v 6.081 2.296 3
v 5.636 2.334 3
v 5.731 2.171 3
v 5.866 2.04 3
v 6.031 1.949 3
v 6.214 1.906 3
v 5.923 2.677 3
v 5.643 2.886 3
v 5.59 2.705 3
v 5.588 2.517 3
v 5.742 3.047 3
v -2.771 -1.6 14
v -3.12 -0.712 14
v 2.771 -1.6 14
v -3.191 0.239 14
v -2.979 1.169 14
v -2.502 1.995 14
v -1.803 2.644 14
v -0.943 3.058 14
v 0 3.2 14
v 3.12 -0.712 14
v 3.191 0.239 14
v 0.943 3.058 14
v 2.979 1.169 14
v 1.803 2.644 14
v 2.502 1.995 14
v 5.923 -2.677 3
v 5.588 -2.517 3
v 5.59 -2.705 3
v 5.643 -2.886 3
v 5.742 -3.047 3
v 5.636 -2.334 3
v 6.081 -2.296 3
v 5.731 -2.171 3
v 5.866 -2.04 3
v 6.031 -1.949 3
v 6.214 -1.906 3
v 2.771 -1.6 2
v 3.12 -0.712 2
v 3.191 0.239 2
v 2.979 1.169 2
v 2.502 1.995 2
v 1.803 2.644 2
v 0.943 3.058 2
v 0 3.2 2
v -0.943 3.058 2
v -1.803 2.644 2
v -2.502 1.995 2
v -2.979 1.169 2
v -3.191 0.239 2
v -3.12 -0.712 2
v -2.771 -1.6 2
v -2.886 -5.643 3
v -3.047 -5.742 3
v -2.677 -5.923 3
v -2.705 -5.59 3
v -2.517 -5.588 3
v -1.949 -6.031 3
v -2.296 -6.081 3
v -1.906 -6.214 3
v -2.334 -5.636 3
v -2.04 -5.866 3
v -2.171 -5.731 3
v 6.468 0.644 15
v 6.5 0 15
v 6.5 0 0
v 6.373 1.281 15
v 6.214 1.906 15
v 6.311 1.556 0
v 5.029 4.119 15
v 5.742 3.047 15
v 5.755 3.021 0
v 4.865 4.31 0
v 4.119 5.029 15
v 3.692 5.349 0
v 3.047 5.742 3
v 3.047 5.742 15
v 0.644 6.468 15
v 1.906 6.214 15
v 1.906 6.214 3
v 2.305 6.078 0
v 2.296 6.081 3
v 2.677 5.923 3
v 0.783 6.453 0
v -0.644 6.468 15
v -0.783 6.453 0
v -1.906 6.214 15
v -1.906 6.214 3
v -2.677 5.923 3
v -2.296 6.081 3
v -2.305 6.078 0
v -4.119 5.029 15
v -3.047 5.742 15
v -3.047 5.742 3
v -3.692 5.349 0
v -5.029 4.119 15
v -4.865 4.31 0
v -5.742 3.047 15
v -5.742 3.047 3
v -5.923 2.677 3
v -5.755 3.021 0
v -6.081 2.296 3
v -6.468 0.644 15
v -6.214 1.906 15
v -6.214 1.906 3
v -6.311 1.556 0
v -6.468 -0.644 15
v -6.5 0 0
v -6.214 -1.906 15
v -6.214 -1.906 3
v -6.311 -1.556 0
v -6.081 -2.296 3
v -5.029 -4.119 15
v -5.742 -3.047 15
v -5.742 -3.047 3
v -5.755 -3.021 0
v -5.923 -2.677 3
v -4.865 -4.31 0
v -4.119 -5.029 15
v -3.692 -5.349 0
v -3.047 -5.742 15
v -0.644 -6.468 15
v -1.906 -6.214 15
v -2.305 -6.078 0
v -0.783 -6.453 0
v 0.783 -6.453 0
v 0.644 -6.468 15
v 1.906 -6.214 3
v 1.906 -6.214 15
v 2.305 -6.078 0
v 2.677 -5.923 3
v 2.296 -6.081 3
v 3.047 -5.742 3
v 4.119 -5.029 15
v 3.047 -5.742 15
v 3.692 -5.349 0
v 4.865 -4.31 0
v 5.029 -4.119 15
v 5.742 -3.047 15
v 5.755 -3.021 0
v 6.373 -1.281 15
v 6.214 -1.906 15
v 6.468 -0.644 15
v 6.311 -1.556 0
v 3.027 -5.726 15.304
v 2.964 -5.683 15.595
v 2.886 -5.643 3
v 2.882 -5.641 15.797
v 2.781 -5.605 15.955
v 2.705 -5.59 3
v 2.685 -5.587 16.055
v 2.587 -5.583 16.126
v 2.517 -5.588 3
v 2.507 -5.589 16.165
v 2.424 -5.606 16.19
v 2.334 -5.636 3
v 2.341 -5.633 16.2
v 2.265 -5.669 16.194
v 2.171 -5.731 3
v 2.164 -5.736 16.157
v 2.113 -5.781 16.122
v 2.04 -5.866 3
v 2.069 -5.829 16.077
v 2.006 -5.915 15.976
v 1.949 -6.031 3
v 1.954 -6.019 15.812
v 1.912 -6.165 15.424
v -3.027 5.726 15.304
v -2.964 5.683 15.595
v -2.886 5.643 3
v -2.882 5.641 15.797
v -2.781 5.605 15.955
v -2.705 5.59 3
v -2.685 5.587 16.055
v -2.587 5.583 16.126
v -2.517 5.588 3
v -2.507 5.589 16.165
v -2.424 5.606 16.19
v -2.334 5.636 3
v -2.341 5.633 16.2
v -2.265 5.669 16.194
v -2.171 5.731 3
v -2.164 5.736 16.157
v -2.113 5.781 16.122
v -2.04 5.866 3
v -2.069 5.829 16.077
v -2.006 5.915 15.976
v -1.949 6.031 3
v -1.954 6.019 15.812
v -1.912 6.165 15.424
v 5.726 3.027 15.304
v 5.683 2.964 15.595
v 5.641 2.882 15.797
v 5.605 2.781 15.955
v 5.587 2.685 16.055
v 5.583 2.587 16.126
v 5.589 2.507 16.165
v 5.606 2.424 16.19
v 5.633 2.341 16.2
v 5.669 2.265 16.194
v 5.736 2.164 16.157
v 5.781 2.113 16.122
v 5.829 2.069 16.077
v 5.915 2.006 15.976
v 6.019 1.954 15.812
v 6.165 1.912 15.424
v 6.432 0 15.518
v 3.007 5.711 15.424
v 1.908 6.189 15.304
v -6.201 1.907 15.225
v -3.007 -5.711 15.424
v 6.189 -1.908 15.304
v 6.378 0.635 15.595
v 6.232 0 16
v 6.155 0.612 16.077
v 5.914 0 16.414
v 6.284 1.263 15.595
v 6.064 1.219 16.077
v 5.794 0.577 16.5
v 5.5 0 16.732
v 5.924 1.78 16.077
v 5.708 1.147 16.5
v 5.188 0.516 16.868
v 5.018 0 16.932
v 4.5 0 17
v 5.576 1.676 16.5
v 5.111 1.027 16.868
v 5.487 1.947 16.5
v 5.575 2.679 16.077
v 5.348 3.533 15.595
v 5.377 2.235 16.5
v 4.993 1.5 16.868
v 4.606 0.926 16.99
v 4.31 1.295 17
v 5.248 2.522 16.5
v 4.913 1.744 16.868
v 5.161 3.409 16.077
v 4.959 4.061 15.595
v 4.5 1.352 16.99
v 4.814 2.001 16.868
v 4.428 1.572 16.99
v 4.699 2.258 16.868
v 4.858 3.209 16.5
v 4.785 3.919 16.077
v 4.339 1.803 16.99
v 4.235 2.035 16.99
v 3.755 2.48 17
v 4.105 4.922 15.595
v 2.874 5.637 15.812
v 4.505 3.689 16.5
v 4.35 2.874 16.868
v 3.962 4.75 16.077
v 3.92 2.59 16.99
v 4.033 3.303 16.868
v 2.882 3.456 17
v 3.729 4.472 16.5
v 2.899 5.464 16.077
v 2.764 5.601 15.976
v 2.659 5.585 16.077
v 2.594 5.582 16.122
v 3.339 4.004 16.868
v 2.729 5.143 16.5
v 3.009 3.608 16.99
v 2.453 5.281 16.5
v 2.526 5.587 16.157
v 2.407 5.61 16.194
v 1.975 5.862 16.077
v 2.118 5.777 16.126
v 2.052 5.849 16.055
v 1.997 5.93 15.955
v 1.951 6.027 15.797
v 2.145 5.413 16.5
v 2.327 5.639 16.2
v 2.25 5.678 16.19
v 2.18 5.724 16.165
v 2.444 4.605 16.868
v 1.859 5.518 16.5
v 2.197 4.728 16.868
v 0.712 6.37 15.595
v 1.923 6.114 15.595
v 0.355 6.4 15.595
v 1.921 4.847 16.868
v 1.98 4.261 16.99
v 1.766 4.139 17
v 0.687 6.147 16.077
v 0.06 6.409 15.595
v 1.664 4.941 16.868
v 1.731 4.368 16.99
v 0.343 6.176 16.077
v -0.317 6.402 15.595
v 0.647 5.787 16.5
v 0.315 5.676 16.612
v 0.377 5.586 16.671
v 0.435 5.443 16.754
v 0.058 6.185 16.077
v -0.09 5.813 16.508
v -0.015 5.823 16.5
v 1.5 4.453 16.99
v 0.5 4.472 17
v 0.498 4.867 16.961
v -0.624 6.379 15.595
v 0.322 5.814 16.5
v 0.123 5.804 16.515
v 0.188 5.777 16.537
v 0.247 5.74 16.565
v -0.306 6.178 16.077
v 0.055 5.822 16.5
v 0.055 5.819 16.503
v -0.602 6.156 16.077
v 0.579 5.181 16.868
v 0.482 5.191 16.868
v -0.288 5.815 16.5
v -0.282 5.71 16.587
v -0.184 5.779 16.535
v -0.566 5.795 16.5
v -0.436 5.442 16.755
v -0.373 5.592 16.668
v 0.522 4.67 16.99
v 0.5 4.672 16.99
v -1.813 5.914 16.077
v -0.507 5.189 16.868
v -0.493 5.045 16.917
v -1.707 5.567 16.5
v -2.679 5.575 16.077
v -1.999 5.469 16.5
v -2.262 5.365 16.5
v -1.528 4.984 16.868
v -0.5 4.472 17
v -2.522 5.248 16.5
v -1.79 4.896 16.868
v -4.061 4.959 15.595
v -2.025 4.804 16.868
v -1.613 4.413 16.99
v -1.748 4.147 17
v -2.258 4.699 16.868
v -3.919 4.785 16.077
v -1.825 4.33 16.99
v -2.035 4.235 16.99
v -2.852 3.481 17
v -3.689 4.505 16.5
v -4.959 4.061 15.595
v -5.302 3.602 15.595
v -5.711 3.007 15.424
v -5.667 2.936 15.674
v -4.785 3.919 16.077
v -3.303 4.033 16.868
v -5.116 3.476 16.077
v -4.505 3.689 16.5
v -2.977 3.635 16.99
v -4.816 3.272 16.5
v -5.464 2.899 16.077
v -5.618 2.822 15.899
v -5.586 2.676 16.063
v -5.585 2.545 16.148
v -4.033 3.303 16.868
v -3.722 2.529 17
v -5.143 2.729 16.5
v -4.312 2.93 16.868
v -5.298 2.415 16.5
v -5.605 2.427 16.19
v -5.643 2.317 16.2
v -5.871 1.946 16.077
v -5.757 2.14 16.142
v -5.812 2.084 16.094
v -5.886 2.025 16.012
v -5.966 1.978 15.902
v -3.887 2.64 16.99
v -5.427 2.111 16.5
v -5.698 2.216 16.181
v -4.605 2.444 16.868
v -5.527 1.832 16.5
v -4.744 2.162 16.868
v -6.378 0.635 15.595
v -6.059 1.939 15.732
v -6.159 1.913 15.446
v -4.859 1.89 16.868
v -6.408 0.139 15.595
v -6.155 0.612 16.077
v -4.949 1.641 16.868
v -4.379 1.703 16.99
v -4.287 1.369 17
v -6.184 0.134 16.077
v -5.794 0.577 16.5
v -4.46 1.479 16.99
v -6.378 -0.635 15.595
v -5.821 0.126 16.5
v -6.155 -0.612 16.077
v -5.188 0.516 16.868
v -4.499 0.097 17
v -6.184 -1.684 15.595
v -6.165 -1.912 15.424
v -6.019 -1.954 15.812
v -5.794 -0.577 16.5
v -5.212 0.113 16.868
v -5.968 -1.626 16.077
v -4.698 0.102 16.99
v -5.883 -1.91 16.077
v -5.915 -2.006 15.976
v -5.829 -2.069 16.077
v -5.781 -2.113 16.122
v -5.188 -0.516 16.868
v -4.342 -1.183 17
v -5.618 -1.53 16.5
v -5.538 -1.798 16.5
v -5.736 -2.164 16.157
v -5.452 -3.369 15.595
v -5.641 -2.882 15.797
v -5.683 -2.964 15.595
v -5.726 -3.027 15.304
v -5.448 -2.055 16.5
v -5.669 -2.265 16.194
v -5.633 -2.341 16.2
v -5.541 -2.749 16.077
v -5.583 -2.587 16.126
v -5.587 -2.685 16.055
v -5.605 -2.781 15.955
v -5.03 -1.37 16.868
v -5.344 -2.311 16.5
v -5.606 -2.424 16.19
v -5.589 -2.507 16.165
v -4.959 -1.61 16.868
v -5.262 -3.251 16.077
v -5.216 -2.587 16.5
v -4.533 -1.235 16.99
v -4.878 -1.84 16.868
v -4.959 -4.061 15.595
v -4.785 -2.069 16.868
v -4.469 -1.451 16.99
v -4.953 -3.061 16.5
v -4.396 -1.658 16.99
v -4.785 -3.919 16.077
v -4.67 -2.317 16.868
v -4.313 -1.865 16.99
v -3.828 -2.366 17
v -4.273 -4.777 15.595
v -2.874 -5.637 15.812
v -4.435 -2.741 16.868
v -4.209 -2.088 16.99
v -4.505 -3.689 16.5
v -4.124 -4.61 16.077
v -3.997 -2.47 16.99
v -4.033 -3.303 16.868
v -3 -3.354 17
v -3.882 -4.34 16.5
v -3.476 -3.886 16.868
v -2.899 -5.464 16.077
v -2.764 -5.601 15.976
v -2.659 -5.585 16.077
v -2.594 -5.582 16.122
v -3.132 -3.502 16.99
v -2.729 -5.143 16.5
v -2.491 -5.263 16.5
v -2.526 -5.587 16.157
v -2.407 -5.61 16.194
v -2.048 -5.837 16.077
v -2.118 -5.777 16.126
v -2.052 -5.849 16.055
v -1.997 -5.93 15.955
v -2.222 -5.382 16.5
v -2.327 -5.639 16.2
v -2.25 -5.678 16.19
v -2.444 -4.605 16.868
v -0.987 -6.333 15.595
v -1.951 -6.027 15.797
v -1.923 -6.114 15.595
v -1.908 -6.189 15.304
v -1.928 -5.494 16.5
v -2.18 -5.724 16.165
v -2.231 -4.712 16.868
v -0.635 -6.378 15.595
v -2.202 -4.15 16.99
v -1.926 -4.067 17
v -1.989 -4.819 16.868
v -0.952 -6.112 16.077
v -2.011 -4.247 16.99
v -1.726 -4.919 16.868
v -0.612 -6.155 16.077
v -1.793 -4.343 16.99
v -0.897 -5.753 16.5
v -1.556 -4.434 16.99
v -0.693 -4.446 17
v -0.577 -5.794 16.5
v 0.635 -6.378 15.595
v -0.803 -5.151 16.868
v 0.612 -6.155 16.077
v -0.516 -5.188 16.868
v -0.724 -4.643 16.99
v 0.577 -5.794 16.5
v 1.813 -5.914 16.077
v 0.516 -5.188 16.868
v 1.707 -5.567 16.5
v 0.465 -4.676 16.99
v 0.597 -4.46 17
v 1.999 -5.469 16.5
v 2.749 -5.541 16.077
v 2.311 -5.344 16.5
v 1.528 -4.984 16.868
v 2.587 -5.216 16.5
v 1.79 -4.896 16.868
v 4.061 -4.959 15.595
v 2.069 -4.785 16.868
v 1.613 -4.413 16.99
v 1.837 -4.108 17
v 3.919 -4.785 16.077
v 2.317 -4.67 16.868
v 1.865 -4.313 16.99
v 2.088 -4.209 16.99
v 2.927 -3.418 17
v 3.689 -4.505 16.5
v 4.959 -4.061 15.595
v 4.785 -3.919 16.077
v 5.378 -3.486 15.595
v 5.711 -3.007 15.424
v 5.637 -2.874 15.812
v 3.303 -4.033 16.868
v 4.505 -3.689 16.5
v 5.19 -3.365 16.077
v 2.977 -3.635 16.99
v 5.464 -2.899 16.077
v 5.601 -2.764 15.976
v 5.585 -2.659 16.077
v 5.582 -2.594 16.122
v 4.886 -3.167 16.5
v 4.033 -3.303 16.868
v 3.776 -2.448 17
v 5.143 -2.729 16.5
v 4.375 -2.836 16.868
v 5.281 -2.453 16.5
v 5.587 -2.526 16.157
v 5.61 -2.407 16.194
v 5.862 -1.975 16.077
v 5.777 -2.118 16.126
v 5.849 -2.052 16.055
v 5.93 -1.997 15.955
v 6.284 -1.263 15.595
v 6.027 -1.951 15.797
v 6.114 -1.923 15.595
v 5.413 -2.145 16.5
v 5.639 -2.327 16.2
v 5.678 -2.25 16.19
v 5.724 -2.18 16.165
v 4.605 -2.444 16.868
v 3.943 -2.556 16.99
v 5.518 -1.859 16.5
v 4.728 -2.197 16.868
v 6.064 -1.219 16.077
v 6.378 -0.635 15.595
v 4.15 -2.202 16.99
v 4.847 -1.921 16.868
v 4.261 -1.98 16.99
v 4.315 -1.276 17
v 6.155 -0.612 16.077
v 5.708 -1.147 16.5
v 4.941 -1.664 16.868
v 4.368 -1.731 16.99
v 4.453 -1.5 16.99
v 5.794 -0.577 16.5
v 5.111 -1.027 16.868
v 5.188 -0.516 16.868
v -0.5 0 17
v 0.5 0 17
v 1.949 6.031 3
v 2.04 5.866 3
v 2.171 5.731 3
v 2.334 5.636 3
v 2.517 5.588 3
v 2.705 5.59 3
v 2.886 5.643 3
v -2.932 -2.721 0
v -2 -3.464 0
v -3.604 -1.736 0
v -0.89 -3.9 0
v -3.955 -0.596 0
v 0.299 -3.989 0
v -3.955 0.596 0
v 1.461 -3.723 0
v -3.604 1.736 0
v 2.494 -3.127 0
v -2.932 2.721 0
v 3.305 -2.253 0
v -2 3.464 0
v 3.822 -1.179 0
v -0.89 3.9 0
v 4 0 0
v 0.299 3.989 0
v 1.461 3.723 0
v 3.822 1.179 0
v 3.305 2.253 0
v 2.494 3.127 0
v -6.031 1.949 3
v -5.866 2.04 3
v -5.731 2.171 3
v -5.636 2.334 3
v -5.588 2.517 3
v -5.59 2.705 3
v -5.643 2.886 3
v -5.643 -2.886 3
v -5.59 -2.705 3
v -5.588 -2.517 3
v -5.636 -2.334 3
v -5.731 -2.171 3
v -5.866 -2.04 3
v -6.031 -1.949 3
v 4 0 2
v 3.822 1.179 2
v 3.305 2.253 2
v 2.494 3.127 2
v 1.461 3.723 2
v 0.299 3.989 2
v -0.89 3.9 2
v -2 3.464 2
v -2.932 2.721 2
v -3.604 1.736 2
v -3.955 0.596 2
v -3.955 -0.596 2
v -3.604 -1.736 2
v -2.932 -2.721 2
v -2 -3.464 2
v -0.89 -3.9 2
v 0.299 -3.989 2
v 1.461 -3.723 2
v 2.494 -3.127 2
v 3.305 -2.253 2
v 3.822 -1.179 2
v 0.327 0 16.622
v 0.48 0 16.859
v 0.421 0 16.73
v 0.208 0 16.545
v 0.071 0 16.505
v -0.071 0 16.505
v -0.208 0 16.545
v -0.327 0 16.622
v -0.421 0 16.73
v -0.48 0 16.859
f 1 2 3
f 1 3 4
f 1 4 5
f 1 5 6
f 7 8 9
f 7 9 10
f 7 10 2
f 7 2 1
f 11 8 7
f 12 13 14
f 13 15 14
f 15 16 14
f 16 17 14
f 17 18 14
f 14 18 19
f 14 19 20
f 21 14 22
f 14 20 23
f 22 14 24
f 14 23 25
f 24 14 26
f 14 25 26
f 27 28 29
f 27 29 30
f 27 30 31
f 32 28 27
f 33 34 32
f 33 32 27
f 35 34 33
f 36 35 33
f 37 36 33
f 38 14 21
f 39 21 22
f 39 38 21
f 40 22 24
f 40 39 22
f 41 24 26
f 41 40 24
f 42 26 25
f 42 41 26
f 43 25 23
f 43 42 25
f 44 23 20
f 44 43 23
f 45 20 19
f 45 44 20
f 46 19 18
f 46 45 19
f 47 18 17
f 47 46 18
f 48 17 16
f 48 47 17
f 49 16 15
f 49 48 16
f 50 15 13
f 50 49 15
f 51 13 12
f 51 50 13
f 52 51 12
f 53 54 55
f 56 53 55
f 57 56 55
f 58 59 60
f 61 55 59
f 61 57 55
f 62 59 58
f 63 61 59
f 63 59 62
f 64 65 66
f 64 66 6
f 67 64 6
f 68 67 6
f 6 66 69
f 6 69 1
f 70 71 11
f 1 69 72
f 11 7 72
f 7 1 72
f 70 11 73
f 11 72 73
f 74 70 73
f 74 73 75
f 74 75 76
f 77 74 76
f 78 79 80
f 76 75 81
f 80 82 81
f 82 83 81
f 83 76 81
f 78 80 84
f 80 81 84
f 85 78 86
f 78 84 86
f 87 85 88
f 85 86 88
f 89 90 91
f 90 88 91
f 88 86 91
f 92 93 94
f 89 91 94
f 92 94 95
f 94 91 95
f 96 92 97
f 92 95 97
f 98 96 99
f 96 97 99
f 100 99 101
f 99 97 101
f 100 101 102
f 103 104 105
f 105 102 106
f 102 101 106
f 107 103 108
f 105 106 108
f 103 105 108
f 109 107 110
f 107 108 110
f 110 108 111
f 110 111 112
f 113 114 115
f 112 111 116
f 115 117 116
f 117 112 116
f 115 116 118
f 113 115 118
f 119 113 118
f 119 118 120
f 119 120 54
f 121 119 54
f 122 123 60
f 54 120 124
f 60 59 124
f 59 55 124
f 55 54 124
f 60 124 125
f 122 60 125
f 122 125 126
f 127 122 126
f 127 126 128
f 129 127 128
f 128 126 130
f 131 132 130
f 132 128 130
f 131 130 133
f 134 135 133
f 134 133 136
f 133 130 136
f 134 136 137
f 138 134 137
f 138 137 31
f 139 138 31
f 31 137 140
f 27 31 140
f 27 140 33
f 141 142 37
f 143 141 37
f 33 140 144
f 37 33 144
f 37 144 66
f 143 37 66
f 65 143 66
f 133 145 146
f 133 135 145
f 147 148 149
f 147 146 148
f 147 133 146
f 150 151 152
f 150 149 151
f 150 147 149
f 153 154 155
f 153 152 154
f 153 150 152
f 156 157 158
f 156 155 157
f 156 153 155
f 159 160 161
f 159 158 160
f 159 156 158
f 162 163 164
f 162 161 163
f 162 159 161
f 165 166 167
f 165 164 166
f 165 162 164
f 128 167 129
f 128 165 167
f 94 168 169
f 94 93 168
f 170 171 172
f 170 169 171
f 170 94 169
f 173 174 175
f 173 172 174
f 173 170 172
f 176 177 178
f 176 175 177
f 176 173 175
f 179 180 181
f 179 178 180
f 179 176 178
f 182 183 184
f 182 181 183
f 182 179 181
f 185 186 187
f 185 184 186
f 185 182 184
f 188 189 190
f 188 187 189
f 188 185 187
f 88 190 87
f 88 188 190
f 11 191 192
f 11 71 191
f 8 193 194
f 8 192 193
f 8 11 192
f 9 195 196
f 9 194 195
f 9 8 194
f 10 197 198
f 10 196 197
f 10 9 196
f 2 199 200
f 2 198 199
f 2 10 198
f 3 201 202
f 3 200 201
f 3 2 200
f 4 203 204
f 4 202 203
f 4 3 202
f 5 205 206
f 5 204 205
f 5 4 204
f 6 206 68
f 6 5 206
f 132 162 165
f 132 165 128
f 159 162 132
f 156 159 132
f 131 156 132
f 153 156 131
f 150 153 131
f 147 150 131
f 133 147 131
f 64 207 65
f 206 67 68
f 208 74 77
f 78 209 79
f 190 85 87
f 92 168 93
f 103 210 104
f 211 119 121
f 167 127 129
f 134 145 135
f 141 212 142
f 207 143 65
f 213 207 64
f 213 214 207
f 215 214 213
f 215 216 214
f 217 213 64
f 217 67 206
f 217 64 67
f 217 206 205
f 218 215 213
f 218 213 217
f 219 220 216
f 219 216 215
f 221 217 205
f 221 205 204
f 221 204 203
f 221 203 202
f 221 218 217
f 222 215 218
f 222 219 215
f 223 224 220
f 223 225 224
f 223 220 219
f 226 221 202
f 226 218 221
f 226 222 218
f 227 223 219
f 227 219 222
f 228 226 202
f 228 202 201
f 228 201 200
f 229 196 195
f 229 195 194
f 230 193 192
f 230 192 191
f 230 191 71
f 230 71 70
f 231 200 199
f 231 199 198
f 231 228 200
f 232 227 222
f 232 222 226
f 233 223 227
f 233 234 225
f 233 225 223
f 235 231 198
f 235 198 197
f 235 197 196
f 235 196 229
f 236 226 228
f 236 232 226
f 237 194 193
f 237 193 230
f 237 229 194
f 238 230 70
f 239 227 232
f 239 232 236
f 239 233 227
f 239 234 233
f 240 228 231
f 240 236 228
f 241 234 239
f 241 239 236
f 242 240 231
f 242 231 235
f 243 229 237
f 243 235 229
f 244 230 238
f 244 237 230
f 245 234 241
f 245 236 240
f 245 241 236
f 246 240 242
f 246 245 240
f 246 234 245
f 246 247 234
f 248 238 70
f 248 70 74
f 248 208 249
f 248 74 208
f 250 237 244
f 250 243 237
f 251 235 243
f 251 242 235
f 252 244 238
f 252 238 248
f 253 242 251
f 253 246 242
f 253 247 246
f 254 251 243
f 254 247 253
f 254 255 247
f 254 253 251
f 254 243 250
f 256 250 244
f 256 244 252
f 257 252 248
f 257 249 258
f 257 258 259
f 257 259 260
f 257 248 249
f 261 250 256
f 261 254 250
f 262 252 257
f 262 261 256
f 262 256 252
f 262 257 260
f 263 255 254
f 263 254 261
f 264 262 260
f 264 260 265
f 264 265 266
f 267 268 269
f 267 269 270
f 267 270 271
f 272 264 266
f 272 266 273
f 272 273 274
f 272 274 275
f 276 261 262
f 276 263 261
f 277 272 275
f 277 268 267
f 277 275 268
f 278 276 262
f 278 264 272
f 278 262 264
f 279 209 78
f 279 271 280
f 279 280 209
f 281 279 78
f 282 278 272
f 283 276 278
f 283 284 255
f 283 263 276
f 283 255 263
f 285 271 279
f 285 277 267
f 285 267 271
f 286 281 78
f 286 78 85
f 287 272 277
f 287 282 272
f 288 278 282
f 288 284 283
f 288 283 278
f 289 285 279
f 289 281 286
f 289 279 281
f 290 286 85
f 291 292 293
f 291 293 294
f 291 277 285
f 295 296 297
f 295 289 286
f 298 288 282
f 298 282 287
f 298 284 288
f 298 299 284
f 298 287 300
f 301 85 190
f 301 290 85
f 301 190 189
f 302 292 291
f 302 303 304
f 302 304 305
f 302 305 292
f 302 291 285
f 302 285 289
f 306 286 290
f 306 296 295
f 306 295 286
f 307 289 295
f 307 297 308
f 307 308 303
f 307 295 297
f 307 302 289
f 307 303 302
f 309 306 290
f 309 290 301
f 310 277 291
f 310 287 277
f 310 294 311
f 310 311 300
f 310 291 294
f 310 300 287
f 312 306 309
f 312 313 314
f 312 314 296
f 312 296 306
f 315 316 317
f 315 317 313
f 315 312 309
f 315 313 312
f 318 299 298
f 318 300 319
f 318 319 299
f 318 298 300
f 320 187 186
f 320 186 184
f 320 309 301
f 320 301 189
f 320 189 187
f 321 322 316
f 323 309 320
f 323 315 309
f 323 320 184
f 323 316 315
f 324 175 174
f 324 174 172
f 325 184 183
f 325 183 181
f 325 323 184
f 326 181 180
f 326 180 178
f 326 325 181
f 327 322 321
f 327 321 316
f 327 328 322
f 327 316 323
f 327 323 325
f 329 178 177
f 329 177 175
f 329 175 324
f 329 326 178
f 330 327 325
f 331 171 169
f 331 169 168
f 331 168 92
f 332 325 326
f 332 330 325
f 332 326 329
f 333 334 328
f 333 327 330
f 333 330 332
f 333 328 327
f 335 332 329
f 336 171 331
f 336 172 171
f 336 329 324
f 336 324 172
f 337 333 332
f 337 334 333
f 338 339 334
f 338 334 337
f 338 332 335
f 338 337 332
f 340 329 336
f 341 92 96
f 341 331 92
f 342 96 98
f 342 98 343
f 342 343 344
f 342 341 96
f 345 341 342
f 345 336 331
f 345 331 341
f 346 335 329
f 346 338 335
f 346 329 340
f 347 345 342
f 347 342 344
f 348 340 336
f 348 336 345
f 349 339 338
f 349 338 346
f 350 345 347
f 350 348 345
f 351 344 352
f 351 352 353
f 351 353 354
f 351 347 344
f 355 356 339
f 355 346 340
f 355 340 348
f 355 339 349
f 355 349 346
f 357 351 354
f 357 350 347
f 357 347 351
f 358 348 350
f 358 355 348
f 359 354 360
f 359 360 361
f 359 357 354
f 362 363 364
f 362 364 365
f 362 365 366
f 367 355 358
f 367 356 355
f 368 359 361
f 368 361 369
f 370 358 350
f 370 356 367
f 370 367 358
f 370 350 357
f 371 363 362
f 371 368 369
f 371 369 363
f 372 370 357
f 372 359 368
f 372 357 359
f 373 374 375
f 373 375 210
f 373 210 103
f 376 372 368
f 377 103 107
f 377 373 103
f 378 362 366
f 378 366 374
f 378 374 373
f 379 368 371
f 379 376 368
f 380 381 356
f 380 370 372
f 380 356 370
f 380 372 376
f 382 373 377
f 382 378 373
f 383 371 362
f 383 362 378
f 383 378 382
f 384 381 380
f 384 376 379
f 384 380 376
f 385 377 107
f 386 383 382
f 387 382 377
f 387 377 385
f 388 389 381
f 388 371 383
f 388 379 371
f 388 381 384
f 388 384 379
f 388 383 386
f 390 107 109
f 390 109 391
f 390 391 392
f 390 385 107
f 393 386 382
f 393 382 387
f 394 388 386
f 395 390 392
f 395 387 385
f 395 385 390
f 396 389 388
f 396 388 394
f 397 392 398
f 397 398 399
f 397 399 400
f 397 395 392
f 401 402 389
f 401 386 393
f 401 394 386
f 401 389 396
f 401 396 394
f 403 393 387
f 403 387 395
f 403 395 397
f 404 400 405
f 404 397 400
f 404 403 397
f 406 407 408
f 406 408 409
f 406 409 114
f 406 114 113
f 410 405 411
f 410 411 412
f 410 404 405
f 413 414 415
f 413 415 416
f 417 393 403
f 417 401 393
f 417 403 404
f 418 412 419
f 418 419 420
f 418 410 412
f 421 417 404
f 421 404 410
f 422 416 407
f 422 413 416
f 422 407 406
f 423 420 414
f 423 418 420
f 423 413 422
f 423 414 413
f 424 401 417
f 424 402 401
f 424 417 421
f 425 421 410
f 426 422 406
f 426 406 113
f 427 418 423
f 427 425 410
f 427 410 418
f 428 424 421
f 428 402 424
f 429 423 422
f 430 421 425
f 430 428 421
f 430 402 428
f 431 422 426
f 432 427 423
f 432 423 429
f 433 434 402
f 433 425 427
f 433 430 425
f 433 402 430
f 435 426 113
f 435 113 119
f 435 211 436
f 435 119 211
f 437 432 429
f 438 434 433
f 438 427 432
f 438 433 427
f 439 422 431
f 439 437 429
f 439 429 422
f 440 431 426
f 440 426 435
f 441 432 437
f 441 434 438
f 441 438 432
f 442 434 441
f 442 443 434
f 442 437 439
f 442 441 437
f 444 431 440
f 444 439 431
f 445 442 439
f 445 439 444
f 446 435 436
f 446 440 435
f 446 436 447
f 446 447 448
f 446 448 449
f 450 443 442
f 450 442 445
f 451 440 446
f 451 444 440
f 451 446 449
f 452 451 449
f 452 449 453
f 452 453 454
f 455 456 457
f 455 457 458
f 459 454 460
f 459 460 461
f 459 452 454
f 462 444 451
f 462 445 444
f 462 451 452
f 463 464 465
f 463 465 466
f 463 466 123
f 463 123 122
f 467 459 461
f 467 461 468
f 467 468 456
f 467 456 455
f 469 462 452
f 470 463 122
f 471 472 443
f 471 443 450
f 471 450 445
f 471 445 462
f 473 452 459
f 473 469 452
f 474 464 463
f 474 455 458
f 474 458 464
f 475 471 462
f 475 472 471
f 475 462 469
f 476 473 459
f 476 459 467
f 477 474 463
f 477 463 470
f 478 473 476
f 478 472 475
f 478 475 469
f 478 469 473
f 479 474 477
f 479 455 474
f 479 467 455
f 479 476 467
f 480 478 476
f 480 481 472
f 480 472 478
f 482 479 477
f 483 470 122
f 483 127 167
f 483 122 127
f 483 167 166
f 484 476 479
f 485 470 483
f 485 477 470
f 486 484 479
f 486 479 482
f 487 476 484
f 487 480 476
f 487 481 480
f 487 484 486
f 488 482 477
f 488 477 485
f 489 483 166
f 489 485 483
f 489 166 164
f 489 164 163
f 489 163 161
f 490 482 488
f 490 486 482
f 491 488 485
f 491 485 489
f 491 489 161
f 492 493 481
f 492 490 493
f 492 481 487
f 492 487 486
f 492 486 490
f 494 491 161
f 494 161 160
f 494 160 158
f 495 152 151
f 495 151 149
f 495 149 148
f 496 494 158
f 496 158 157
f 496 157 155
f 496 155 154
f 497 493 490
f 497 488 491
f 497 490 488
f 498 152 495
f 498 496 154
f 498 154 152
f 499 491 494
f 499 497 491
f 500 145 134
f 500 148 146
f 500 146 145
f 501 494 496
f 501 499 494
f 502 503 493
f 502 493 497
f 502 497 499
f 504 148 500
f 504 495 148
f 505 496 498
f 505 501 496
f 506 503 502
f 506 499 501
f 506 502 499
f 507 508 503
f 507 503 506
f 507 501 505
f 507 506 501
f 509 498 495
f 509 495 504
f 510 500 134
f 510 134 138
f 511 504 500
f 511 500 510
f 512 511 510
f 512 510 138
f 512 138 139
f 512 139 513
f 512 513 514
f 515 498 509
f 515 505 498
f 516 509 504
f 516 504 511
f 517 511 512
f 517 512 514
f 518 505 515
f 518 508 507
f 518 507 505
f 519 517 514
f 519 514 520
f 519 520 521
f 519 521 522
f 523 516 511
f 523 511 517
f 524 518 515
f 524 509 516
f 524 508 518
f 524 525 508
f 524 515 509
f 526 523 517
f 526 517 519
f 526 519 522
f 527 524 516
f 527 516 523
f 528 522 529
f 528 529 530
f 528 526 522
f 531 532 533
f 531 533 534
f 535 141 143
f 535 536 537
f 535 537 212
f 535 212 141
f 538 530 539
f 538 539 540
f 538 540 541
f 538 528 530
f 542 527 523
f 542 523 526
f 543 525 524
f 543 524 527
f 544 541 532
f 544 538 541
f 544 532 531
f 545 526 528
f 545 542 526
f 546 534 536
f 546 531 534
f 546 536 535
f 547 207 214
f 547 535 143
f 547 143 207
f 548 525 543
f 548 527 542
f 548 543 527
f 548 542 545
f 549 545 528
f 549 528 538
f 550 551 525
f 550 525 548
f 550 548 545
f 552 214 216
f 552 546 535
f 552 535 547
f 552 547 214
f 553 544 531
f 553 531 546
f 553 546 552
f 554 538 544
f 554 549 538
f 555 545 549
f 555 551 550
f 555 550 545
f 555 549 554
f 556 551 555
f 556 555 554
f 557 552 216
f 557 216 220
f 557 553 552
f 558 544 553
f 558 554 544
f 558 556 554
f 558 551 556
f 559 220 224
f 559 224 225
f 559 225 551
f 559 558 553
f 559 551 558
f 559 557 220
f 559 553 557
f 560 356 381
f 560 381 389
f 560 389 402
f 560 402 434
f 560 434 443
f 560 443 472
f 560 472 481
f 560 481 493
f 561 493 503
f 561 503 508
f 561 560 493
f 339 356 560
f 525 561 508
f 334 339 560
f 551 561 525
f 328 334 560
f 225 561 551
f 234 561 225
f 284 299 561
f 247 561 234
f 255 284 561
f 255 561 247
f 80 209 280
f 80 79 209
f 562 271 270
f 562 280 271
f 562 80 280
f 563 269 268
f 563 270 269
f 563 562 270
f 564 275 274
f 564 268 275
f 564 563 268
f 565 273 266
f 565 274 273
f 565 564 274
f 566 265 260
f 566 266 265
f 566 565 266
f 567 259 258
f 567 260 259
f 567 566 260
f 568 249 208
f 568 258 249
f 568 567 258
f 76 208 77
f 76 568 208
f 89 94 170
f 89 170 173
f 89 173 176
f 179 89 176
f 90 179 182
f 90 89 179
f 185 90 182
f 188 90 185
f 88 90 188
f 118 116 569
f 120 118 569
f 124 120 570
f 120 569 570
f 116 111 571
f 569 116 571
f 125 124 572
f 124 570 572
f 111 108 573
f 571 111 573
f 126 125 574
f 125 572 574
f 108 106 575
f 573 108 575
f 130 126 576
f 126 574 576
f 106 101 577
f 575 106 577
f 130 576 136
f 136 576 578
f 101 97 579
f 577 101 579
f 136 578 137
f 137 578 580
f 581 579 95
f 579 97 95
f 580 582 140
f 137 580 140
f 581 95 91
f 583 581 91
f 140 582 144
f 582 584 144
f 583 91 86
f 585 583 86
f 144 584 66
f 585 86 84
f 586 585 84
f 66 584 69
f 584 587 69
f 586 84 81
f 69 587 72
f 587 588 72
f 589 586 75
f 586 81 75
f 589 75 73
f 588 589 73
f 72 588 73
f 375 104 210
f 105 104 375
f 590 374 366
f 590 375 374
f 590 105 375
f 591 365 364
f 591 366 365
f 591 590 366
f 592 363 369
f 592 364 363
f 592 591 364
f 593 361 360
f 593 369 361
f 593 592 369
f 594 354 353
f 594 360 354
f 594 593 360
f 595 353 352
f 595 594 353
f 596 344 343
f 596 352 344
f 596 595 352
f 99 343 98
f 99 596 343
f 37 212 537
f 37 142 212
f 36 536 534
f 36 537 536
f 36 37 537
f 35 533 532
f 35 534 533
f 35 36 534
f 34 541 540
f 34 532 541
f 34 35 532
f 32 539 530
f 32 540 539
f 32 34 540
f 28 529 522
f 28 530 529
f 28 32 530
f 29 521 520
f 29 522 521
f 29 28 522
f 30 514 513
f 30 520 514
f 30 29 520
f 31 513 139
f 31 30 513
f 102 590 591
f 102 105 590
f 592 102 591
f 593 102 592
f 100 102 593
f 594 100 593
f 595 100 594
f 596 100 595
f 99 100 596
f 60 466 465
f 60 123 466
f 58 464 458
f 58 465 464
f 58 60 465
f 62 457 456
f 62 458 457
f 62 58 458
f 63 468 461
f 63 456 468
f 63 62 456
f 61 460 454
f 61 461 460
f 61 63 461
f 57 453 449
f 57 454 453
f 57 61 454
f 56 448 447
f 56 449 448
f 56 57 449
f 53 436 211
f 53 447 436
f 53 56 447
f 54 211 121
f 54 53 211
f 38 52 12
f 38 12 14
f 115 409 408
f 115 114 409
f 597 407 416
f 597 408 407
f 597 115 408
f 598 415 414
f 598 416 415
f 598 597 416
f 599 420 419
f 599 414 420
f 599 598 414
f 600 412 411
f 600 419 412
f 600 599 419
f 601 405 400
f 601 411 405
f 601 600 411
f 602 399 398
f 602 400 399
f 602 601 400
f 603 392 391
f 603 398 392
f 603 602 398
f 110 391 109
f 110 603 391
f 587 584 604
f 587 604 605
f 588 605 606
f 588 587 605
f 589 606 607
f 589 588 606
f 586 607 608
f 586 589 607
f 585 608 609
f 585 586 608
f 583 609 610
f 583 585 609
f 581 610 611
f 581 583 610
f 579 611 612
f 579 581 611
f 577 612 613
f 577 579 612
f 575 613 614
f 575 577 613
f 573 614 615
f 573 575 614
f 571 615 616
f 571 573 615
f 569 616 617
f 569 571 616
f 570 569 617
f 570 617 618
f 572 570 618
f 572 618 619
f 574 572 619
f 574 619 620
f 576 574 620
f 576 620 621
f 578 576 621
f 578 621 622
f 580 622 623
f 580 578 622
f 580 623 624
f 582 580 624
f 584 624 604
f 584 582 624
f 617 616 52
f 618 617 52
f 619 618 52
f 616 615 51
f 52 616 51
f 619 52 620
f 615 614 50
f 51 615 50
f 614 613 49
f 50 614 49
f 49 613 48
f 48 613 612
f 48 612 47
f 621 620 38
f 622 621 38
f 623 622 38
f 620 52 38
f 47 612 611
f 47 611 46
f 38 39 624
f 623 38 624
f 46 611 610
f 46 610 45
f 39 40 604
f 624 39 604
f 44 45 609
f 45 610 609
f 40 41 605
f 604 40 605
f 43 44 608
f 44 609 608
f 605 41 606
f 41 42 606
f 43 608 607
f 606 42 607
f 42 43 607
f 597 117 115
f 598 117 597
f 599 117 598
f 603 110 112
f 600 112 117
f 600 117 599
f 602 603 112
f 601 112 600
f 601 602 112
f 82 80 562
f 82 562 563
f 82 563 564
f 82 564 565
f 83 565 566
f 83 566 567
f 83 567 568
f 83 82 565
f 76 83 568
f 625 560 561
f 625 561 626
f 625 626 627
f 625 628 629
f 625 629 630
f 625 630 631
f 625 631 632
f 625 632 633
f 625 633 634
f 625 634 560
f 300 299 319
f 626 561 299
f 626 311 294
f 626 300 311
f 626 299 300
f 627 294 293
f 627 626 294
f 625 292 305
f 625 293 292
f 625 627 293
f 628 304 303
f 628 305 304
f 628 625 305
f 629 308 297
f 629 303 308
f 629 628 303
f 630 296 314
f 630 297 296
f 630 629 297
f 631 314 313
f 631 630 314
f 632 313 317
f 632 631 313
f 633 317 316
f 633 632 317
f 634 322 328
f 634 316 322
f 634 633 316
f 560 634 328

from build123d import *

# Parameters (mm, degrees)
CYLINDER_R                    = 4
CYLINDER_DEPTH                = 2
CYLINDER004_R                 = 0.7
CYLINDER004_DEPTH             = 15
CYLINDER005_R                 = 0.7
CYLINDER005_DEPTH             = 15
CYLINDER006_R                 = 0.7
CYLINDER006_DEPTH             = 15
CYLINDER007_R                 = 0.7
CYLINDER007_DEPTH             = 15
CYLINDER008_R                 = 0.7
CYLINDER008_DEPTH             = 15
CYLINDER009_R                 = 0.7
CYLINDER009_DEPTH             = 15
CYLINDER010_R                 = 0.7
CYLINDER010_DEPTH             = 15
CYLINDER003_R                 = 0.7
CYLINDER003_DEPTH             = 15
CUBE_W                        = 10
CUBE_H                        = 5
CUBE_DEPTH                    = 12
CYLINDER011_R                 = 3.2
CYLINDER011_DEPTH             = 12
CUBE001_W                     = 10
CUBE001_H                     = 5
CUBE001_DEPTH                 = 8
CYLINDER012_R                 = 3.2
CYLINDER012_DEPTH             = 2
CYLINDER002_R                 = 0.5
CYLINDER002_DEPTH             = 6.5
CYLINDER001_R                 = 4.5
CYLINDER001_DEPTH             = 2
REFINEROTATEEXTRUDE_R         = 2
ROTATEEXTRUDE_PLACEMENT_ANGLE = 90
CYLINDER_R_2                  = 6.5
CYLINDER_DEPTH_2              = 15


with BuildPart() as cylinder:
    # Cylinder → Cylinder (new body)
    with BuildSketch(Plane.XY):
        Circle(CYLINDER_R)
    extrude(amount=CYLINDER_DEPTH)


with BuildPart() as cylinder004:
    # cylinder004 → cylinder004 (new body)
    with BuildSketch(Plane(origin=(6.28238, 2.60225, 3), x_dir=(1, 0, 0), z_dir=(0, 0, 1))):
        Circle(CYLINDER004_R)
    extrude(amount=CYLINDER004_DEPTH)


with BuildPart() as cylinder005:
    # cylinder005 → cylinder005 (new body)
    with BuildSketch(Plane(origin=(6.28238, -2.60225, 3), x_dir=(1, 0, 0), z_dir=(0, 0, 1))):
        Circle(CYLINDER005_R)
    extrude(amount=CYLINDER005_DEPTH)


with BuildPart() as cylinder006:
    # cylinder006 → cylinder006 (new body)
    with BuildSketch(Plane(origin=(2.60225, -6.28238, 3), x_dir=(1, 0, 0), z_dir=(0, 0, 1))):
        Circle(CYLINDER006_R)
    extrude(amount=CYLINDER006_DEPTH)


with BuildPart() as cylinder007:
    # cylinder007 → cylinder007 (new body)
    with BuildSketch(Plane(origin=(-2.60225, -6.28238, 3), x_dir=(1, 0, 0), z_dir=(0, 0, 1))):
        Circle(CYLINDER007_R)
    extrude(amount=CYLINDER007_DEPTH)


with BuildPart() as cylinder008:
    # cylinder008 → cylinder008 (new body)
    with BuildSketch(Plane(origin=(-6.28238, -2.60225, 3), x_dir=(1, 0, 0), z_dir=(0, 0, 1))):
        Circle(CYLINDER008_R)
    extrude(amount=CYLINDER008_DEPTH)


with BuildPart() as cylinder009:
    # cylinder009 → cylinder009 (new body)
    with BuildSketch(Plane(origin=(-6.28238, 2.60225, 3), x_dir=(1, 0, 0), z_dir=(0, 0, 1))):
        Circle(CYLINDER009_R)
    extrude(amount=CYLINDER009_DEPTH)


with BuildPart() as cylinder010:
    # cylinder010 → cylinder010 (new body)
    with BuildSketch(Plane(origin=(-2.60225, 6.28238, 3), x_dir=(1, 0, 0), z_dir=(0, 0, 1))):
        Circle(CYLINDER010_R)
    extrude(amount=CYLINDER010_DEPTH)


with BuildPart() as group:
    # cylinder003 → cylinder003 (new body)
    with BuildSketch(Plane(origin=(2.60225, 6.28238, 3), x_dir=(1, 0, 0), z_dir=(0, 0, 1))):
        Circle(CYLINDER003_R)
    extrude(amount=CYLINDER003_DEPTH)

    # Group: union cylinder004, cylinder005, cylinder006, cylinder007, cylinder008, cylinder009, cylinder010
    add(cylinder004.part)
    add(cylinder005.part)
    add(cylinder006.part)
    add(cylinder007.part)
    add(cylinder008.part)
    add(cylinder009.part)
    add(cylinder010.part)


with BuildPart() as cube:
    # cube → cube (new body)
    with BuildSketch(Plane(origin=(-5, -6.6, 2), x_dir=(1, 0, 0), z_dir=(0, 0, 1))):
        with Locations((5, 2.5)):
            Rectangle(CUBE_W, CUBE_H)
    extrude(amount=CUBE_DEPTH)


with BuildPart() as difference:
    # cylinder011 → cylinder011 (new body)
    with BuildSketch(Plane.XY.offset(2)):
        Circle(CYLINDER011_R)
    extrude(amount=CYLINDER011_DEPTH)

    # difference: cut cube
    add(cube.part, mode=Mode.SUBTRACT)


with BuildPart() as cube001:
    # cube001 → cube001 (new body)
    with BuildSketch(Plane(origin=(-5, -6.6, 0), x_dir=(1, 0, 0), z_dir=(0, 0, 1))):
        with Locations((5, 2.5)):
            Rectangle(CUBE001_W, CUBE001_H)
    extrude(amount=CUBE001_DEPTH)


with BuildPart() as difference001:
    # cylinder012 → cylinder012 (new body)
    with BuildSketch(Plane.XY):
        Circle(CYLINDER012_R)
    extrude(amount=CYLINDER012_DEPTH)

    # difference001: cut cube001
    add(cube001.part, mode=Mode.SUBTRACT)


with BuildPart() as union001:
    # cylinder002 → cylinder002 (new body)
    with BuildSketch(Plane(origin=(0, 0, 17), x_dir=(1, 0, 0), z_dir=(0, 1, 0))):
        Circle(CYLINDER002_R)
    extrude(amount=CYLINDER002_DEPTH)

    # union001: union Group, difference, difference001
    add(group.part)
    add(difference.part)
    add(difference001.part)


with BuildPart() as cylinder001:
    # cylinder001 → cylinder001 (new body)
    with BuildSketch(Plane.XY.offset(15)):
        Circle(CYLINDER001_R)
    extrude(amount=CYLINDER001_DEPTH)


with BuildPart() as rotateextrude:
    # RefineRotateExtrude → RotateExtrude (revolve)
    with BuildSketch(Plane(origin=(4.5, 0, 0), x_dir=(0, 1, 0), z_dir=(0, 0, 1))):
        Circle(REFINEROTATEEXTRUDE_R)
    revolve(axis=Axis((0, 0, 0), (0, 1, 0)))


with BuildPart() as rotateextrude_1:
    # RotateExtrude placement: moved
    add(rotateextrude.part.moved(Location((0, 0, 15))).rotate(Axis((0, 0, 15), (1, 0, 0)), ROTATEEXTRUDE_PLACEMENT_ANGLE))


with BuildPart() as cut:
    # cylinder → cylinder (new body)
    with BuildSketch(Plane.XY):
        Circle(CYLINDER_R_2)
    extrude(amount=CYLINDER_DEPTH_2)

    # union: union cylinder001, RotateExtrude
    add(cylinder001.part)
    add(rotateextrude_1.part)

    # difference002: cut union001
    add(union001.part, mode=Mode.SUBTRACT)

    # Cut: cut Cylinder
    add(cylinder.part, mode=Mode.SUBTRACT)


solid = cut.part
